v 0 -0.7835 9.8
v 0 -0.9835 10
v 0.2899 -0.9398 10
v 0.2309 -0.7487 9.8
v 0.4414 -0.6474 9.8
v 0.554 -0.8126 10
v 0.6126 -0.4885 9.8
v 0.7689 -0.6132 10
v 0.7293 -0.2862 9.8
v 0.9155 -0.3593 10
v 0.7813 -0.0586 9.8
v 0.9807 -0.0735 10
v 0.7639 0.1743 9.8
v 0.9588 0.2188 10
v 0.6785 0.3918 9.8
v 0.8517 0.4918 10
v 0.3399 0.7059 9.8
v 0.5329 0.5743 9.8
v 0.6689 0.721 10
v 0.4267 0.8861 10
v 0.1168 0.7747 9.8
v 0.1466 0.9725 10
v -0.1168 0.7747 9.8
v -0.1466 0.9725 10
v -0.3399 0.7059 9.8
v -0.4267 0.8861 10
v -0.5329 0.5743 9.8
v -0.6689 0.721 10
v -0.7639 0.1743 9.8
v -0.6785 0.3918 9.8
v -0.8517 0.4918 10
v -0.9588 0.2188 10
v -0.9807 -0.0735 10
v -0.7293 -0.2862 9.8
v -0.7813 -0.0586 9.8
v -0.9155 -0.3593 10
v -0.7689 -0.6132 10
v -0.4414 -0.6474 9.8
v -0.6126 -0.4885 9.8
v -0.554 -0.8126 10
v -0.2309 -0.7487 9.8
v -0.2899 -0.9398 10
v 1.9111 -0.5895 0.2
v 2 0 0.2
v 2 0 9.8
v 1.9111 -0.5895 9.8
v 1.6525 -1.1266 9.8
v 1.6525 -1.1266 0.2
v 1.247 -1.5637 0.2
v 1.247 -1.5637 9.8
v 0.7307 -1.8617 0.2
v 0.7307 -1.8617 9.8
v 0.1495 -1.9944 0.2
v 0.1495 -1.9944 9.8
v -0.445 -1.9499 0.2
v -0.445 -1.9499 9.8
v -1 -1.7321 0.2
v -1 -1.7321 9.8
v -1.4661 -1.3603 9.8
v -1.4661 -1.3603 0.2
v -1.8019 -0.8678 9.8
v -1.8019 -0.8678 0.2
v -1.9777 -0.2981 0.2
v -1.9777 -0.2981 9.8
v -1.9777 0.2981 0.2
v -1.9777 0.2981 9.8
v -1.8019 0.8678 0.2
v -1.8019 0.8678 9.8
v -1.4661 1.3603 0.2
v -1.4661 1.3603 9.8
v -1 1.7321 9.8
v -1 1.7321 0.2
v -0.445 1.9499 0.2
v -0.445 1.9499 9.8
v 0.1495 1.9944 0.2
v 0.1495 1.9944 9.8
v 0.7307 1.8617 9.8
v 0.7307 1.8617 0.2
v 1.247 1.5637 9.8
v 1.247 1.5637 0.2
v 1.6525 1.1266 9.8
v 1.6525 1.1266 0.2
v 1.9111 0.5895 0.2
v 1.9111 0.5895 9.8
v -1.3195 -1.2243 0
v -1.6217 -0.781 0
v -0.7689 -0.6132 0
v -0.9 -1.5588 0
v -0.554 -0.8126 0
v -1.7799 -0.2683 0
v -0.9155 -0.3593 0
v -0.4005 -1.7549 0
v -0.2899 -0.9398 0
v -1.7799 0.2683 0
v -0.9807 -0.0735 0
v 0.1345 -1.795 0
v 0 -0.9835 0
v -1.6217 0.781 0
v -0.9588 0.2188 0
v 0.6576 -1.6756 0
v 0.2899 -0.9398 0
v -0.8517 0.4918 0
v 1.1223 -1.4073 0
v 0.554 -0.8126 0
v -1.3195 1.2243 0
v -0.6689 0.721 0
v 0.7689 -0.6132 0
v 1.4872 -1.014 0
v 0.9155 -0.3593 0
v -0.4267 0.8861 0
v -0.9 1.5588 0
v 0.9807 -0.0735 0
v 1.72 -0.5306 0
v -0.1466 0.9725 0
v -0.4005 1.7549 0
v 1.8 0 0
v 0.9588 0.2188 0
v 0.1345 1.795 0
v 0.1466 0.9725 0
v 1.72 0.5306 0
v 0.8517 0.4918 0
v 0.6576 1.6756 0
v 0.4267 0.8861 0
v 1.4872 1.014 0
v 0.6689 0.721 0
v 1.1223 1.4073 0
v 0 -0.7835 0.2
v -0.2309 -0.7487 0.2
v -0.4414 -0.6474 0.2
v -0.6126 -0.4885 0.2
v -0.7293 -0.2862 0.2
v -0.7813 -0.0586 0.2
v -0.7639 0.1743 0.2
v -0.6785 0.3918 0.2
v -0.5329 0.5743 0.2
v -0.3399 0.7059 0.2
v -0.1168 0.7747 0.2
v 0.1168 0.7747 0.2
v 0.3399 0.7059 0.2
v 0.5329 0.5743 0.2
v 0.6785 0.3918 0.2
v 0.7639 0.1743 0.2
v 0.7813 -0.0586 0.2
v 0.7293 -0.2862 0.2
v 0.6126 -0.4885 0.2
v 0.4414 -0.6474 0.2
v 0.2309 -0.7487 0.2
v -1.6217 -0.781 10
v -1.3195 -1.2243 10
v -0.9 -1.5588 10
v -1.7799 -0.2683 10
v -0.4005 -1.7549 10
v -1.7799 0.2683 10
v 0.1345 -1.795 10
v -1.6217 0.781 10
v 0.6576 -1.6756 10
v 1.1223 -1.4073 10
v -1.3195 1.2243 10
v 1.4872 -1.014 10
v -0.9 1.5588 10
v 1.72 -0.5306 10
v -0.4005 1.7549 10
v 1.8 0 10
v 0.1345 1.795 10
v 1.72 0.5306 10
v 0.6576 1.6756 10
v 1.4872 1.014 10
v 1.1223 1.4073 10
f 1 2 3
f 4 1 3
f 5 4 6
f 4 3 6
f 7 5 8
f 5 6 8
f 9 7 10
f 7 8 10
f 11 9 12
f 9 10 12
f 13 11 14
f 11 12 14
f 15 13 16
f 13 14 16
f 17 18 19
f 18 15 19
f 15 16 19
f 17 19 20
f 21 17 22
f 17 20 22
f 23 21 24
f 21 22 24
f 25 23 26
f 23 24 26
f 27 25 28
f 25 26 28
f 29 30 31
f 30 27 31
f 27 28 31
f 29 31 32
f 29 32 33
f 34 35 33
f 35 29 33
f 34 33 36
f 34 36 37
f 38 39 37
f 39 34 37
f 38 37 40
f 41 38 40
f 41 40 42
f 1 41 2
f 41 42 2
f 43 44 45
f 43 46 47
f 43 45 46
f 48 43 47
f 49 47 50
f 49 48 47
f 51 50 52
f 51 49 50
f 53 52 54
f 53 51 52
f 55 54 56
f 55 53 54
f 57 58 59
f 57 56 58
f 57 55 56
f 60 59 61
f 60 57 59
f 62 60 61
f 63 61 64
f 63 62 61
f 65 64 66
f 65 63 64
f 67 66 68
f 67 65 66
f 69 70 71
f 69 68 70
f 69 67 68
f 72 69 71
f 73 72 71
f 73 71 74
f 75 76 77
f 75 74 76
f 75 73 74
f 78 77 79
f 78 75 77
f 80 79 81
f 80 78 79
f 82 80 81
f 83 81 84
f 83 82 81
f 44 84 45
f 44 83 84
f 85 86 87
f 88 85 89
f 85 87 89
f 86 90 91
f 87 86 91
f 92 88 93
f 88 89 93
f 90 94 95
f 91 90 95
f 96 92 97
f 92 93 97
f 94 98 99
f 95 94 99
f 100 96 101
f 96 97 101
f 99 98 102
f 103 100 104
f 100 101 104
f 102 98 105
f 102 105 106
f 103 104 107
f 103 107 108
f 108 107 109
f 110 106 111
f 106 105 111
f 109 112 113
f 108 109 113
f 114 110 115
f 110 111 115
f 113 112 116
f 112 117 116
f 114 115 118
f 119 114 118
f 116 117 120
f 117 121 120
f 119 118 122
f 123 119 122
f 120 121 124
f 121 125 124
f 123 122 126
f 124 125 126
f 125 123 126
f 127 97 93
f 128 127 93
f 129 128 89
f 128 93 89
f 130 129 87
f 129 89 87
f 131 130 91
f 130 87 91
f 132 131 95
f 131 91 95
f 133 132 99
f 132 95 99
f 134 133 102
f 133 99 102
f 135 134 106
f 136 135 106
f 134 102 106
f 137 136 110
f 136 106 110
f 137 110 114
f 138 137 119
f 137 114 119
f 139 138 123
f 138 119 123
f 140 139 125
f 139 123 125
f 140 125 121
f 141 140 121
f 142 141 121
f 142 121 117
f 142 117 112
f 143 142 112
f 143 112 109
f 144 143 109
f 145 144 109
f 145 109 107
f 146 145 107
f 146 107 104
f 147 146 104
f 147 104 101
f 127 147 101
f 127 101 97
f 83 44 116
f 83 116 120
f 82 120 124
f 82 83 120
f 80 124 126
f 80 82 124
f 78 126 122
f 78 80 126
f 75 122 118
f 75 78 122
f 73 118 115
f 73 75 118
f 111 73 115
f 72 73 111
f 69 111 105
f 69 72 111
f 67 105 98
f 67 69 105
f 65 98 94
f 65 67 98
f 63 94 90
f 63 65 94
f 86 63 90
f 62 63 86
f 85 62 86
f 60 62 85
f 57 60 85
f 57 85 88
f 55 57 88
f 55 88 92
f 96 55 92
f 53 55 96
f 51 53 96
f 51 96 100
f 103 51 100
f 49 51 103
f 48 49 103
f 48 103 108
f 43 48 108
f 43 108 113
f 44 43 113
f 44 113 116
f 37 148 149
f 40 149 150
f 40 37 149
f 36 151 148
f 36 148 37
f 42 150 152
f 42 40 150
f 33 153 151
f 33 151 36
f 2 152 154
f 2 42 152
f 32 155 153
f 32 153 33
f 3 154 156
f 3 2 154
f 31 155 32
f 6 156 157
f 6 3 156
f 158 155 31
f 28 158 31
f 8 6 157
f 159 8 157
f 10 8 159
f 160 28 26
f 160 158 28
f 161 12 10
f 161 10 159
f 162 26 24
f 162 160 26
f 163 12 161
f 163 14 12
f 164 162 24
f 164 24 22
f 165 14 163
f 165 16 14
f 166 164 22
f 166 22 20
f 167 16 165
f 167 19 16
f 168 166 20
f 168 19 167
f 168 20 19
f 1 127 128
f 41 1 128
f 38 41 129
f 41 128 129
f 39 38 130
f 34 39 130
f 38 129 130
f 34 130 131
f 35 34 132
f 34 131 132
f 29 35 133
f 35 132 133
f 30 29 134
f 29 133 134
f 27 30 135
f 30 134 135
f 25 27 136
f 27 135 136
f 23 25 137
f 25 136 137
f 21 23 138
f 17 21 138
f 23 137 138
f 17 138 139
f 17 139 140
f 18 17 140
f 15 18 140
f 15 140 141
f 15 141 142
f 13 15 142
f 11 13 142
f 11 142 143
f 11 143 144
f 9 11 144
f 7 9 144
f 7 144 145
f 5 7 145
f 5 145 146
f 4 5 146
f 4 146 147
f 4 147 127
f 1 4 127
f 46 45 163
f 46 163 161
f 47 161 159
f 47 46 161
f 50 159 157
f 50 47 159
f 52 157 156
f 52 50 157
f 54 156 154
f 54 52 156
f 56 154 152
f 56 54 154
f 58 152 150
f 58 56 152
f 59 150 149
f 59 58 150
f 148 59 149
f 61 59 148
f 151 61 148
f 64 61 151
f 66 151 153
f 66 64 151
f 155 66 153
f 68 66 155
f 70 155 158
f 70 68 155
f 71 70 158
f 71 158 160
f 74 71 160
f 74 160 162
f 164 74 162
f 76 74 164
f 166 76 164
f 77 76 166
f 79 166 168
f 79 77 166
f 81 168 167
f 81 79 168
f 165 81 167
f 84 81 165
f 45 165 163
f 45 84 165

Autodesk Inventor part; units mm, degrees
ref_plane "YZ Plane" through (0, 0, 0) normal (1, 0, 0) x (0, 1, 0)
ref_plane "XZ Plane" through (0, 0, 0) normal (0, 1, 0) x (-1, 0, 0)
ref_plane "XY Plane" through (0, 0, 0) normal (0, 0, 1) x (1, 0, 0)
sketch "スケッチ1" plane through (0, 0, 0) normal (0, 0, 1) x (1, 0, 0)
  circle A0 centre (0, 0) radius 2
  dimension "d13" = 4
extrude "押し出し1" add sketch "スケッチ1" along normal blind 10
sketch "スケッチ2" plane through (0, 0, 10) normal (0, 0, 1) x (1, 0, 0)
  point P0 (0, 0)
  point P1 (0, 0)
hole "穴1" at (0, 0, 10) direction (0, 0, -1) diameter 1.567 end through all thread size "M2x0.4" class "6H" standard "ANSI Metric M Profile"
chamfer "面取り1" distance 0.2 angle 45 4 edges at (0, 0.7835, 10) (0, 0.7835, 0) (-2, 0, 10) (-2, 0, 0)
properties part number "ARU-2010" material "鋼、炭素鋼"
